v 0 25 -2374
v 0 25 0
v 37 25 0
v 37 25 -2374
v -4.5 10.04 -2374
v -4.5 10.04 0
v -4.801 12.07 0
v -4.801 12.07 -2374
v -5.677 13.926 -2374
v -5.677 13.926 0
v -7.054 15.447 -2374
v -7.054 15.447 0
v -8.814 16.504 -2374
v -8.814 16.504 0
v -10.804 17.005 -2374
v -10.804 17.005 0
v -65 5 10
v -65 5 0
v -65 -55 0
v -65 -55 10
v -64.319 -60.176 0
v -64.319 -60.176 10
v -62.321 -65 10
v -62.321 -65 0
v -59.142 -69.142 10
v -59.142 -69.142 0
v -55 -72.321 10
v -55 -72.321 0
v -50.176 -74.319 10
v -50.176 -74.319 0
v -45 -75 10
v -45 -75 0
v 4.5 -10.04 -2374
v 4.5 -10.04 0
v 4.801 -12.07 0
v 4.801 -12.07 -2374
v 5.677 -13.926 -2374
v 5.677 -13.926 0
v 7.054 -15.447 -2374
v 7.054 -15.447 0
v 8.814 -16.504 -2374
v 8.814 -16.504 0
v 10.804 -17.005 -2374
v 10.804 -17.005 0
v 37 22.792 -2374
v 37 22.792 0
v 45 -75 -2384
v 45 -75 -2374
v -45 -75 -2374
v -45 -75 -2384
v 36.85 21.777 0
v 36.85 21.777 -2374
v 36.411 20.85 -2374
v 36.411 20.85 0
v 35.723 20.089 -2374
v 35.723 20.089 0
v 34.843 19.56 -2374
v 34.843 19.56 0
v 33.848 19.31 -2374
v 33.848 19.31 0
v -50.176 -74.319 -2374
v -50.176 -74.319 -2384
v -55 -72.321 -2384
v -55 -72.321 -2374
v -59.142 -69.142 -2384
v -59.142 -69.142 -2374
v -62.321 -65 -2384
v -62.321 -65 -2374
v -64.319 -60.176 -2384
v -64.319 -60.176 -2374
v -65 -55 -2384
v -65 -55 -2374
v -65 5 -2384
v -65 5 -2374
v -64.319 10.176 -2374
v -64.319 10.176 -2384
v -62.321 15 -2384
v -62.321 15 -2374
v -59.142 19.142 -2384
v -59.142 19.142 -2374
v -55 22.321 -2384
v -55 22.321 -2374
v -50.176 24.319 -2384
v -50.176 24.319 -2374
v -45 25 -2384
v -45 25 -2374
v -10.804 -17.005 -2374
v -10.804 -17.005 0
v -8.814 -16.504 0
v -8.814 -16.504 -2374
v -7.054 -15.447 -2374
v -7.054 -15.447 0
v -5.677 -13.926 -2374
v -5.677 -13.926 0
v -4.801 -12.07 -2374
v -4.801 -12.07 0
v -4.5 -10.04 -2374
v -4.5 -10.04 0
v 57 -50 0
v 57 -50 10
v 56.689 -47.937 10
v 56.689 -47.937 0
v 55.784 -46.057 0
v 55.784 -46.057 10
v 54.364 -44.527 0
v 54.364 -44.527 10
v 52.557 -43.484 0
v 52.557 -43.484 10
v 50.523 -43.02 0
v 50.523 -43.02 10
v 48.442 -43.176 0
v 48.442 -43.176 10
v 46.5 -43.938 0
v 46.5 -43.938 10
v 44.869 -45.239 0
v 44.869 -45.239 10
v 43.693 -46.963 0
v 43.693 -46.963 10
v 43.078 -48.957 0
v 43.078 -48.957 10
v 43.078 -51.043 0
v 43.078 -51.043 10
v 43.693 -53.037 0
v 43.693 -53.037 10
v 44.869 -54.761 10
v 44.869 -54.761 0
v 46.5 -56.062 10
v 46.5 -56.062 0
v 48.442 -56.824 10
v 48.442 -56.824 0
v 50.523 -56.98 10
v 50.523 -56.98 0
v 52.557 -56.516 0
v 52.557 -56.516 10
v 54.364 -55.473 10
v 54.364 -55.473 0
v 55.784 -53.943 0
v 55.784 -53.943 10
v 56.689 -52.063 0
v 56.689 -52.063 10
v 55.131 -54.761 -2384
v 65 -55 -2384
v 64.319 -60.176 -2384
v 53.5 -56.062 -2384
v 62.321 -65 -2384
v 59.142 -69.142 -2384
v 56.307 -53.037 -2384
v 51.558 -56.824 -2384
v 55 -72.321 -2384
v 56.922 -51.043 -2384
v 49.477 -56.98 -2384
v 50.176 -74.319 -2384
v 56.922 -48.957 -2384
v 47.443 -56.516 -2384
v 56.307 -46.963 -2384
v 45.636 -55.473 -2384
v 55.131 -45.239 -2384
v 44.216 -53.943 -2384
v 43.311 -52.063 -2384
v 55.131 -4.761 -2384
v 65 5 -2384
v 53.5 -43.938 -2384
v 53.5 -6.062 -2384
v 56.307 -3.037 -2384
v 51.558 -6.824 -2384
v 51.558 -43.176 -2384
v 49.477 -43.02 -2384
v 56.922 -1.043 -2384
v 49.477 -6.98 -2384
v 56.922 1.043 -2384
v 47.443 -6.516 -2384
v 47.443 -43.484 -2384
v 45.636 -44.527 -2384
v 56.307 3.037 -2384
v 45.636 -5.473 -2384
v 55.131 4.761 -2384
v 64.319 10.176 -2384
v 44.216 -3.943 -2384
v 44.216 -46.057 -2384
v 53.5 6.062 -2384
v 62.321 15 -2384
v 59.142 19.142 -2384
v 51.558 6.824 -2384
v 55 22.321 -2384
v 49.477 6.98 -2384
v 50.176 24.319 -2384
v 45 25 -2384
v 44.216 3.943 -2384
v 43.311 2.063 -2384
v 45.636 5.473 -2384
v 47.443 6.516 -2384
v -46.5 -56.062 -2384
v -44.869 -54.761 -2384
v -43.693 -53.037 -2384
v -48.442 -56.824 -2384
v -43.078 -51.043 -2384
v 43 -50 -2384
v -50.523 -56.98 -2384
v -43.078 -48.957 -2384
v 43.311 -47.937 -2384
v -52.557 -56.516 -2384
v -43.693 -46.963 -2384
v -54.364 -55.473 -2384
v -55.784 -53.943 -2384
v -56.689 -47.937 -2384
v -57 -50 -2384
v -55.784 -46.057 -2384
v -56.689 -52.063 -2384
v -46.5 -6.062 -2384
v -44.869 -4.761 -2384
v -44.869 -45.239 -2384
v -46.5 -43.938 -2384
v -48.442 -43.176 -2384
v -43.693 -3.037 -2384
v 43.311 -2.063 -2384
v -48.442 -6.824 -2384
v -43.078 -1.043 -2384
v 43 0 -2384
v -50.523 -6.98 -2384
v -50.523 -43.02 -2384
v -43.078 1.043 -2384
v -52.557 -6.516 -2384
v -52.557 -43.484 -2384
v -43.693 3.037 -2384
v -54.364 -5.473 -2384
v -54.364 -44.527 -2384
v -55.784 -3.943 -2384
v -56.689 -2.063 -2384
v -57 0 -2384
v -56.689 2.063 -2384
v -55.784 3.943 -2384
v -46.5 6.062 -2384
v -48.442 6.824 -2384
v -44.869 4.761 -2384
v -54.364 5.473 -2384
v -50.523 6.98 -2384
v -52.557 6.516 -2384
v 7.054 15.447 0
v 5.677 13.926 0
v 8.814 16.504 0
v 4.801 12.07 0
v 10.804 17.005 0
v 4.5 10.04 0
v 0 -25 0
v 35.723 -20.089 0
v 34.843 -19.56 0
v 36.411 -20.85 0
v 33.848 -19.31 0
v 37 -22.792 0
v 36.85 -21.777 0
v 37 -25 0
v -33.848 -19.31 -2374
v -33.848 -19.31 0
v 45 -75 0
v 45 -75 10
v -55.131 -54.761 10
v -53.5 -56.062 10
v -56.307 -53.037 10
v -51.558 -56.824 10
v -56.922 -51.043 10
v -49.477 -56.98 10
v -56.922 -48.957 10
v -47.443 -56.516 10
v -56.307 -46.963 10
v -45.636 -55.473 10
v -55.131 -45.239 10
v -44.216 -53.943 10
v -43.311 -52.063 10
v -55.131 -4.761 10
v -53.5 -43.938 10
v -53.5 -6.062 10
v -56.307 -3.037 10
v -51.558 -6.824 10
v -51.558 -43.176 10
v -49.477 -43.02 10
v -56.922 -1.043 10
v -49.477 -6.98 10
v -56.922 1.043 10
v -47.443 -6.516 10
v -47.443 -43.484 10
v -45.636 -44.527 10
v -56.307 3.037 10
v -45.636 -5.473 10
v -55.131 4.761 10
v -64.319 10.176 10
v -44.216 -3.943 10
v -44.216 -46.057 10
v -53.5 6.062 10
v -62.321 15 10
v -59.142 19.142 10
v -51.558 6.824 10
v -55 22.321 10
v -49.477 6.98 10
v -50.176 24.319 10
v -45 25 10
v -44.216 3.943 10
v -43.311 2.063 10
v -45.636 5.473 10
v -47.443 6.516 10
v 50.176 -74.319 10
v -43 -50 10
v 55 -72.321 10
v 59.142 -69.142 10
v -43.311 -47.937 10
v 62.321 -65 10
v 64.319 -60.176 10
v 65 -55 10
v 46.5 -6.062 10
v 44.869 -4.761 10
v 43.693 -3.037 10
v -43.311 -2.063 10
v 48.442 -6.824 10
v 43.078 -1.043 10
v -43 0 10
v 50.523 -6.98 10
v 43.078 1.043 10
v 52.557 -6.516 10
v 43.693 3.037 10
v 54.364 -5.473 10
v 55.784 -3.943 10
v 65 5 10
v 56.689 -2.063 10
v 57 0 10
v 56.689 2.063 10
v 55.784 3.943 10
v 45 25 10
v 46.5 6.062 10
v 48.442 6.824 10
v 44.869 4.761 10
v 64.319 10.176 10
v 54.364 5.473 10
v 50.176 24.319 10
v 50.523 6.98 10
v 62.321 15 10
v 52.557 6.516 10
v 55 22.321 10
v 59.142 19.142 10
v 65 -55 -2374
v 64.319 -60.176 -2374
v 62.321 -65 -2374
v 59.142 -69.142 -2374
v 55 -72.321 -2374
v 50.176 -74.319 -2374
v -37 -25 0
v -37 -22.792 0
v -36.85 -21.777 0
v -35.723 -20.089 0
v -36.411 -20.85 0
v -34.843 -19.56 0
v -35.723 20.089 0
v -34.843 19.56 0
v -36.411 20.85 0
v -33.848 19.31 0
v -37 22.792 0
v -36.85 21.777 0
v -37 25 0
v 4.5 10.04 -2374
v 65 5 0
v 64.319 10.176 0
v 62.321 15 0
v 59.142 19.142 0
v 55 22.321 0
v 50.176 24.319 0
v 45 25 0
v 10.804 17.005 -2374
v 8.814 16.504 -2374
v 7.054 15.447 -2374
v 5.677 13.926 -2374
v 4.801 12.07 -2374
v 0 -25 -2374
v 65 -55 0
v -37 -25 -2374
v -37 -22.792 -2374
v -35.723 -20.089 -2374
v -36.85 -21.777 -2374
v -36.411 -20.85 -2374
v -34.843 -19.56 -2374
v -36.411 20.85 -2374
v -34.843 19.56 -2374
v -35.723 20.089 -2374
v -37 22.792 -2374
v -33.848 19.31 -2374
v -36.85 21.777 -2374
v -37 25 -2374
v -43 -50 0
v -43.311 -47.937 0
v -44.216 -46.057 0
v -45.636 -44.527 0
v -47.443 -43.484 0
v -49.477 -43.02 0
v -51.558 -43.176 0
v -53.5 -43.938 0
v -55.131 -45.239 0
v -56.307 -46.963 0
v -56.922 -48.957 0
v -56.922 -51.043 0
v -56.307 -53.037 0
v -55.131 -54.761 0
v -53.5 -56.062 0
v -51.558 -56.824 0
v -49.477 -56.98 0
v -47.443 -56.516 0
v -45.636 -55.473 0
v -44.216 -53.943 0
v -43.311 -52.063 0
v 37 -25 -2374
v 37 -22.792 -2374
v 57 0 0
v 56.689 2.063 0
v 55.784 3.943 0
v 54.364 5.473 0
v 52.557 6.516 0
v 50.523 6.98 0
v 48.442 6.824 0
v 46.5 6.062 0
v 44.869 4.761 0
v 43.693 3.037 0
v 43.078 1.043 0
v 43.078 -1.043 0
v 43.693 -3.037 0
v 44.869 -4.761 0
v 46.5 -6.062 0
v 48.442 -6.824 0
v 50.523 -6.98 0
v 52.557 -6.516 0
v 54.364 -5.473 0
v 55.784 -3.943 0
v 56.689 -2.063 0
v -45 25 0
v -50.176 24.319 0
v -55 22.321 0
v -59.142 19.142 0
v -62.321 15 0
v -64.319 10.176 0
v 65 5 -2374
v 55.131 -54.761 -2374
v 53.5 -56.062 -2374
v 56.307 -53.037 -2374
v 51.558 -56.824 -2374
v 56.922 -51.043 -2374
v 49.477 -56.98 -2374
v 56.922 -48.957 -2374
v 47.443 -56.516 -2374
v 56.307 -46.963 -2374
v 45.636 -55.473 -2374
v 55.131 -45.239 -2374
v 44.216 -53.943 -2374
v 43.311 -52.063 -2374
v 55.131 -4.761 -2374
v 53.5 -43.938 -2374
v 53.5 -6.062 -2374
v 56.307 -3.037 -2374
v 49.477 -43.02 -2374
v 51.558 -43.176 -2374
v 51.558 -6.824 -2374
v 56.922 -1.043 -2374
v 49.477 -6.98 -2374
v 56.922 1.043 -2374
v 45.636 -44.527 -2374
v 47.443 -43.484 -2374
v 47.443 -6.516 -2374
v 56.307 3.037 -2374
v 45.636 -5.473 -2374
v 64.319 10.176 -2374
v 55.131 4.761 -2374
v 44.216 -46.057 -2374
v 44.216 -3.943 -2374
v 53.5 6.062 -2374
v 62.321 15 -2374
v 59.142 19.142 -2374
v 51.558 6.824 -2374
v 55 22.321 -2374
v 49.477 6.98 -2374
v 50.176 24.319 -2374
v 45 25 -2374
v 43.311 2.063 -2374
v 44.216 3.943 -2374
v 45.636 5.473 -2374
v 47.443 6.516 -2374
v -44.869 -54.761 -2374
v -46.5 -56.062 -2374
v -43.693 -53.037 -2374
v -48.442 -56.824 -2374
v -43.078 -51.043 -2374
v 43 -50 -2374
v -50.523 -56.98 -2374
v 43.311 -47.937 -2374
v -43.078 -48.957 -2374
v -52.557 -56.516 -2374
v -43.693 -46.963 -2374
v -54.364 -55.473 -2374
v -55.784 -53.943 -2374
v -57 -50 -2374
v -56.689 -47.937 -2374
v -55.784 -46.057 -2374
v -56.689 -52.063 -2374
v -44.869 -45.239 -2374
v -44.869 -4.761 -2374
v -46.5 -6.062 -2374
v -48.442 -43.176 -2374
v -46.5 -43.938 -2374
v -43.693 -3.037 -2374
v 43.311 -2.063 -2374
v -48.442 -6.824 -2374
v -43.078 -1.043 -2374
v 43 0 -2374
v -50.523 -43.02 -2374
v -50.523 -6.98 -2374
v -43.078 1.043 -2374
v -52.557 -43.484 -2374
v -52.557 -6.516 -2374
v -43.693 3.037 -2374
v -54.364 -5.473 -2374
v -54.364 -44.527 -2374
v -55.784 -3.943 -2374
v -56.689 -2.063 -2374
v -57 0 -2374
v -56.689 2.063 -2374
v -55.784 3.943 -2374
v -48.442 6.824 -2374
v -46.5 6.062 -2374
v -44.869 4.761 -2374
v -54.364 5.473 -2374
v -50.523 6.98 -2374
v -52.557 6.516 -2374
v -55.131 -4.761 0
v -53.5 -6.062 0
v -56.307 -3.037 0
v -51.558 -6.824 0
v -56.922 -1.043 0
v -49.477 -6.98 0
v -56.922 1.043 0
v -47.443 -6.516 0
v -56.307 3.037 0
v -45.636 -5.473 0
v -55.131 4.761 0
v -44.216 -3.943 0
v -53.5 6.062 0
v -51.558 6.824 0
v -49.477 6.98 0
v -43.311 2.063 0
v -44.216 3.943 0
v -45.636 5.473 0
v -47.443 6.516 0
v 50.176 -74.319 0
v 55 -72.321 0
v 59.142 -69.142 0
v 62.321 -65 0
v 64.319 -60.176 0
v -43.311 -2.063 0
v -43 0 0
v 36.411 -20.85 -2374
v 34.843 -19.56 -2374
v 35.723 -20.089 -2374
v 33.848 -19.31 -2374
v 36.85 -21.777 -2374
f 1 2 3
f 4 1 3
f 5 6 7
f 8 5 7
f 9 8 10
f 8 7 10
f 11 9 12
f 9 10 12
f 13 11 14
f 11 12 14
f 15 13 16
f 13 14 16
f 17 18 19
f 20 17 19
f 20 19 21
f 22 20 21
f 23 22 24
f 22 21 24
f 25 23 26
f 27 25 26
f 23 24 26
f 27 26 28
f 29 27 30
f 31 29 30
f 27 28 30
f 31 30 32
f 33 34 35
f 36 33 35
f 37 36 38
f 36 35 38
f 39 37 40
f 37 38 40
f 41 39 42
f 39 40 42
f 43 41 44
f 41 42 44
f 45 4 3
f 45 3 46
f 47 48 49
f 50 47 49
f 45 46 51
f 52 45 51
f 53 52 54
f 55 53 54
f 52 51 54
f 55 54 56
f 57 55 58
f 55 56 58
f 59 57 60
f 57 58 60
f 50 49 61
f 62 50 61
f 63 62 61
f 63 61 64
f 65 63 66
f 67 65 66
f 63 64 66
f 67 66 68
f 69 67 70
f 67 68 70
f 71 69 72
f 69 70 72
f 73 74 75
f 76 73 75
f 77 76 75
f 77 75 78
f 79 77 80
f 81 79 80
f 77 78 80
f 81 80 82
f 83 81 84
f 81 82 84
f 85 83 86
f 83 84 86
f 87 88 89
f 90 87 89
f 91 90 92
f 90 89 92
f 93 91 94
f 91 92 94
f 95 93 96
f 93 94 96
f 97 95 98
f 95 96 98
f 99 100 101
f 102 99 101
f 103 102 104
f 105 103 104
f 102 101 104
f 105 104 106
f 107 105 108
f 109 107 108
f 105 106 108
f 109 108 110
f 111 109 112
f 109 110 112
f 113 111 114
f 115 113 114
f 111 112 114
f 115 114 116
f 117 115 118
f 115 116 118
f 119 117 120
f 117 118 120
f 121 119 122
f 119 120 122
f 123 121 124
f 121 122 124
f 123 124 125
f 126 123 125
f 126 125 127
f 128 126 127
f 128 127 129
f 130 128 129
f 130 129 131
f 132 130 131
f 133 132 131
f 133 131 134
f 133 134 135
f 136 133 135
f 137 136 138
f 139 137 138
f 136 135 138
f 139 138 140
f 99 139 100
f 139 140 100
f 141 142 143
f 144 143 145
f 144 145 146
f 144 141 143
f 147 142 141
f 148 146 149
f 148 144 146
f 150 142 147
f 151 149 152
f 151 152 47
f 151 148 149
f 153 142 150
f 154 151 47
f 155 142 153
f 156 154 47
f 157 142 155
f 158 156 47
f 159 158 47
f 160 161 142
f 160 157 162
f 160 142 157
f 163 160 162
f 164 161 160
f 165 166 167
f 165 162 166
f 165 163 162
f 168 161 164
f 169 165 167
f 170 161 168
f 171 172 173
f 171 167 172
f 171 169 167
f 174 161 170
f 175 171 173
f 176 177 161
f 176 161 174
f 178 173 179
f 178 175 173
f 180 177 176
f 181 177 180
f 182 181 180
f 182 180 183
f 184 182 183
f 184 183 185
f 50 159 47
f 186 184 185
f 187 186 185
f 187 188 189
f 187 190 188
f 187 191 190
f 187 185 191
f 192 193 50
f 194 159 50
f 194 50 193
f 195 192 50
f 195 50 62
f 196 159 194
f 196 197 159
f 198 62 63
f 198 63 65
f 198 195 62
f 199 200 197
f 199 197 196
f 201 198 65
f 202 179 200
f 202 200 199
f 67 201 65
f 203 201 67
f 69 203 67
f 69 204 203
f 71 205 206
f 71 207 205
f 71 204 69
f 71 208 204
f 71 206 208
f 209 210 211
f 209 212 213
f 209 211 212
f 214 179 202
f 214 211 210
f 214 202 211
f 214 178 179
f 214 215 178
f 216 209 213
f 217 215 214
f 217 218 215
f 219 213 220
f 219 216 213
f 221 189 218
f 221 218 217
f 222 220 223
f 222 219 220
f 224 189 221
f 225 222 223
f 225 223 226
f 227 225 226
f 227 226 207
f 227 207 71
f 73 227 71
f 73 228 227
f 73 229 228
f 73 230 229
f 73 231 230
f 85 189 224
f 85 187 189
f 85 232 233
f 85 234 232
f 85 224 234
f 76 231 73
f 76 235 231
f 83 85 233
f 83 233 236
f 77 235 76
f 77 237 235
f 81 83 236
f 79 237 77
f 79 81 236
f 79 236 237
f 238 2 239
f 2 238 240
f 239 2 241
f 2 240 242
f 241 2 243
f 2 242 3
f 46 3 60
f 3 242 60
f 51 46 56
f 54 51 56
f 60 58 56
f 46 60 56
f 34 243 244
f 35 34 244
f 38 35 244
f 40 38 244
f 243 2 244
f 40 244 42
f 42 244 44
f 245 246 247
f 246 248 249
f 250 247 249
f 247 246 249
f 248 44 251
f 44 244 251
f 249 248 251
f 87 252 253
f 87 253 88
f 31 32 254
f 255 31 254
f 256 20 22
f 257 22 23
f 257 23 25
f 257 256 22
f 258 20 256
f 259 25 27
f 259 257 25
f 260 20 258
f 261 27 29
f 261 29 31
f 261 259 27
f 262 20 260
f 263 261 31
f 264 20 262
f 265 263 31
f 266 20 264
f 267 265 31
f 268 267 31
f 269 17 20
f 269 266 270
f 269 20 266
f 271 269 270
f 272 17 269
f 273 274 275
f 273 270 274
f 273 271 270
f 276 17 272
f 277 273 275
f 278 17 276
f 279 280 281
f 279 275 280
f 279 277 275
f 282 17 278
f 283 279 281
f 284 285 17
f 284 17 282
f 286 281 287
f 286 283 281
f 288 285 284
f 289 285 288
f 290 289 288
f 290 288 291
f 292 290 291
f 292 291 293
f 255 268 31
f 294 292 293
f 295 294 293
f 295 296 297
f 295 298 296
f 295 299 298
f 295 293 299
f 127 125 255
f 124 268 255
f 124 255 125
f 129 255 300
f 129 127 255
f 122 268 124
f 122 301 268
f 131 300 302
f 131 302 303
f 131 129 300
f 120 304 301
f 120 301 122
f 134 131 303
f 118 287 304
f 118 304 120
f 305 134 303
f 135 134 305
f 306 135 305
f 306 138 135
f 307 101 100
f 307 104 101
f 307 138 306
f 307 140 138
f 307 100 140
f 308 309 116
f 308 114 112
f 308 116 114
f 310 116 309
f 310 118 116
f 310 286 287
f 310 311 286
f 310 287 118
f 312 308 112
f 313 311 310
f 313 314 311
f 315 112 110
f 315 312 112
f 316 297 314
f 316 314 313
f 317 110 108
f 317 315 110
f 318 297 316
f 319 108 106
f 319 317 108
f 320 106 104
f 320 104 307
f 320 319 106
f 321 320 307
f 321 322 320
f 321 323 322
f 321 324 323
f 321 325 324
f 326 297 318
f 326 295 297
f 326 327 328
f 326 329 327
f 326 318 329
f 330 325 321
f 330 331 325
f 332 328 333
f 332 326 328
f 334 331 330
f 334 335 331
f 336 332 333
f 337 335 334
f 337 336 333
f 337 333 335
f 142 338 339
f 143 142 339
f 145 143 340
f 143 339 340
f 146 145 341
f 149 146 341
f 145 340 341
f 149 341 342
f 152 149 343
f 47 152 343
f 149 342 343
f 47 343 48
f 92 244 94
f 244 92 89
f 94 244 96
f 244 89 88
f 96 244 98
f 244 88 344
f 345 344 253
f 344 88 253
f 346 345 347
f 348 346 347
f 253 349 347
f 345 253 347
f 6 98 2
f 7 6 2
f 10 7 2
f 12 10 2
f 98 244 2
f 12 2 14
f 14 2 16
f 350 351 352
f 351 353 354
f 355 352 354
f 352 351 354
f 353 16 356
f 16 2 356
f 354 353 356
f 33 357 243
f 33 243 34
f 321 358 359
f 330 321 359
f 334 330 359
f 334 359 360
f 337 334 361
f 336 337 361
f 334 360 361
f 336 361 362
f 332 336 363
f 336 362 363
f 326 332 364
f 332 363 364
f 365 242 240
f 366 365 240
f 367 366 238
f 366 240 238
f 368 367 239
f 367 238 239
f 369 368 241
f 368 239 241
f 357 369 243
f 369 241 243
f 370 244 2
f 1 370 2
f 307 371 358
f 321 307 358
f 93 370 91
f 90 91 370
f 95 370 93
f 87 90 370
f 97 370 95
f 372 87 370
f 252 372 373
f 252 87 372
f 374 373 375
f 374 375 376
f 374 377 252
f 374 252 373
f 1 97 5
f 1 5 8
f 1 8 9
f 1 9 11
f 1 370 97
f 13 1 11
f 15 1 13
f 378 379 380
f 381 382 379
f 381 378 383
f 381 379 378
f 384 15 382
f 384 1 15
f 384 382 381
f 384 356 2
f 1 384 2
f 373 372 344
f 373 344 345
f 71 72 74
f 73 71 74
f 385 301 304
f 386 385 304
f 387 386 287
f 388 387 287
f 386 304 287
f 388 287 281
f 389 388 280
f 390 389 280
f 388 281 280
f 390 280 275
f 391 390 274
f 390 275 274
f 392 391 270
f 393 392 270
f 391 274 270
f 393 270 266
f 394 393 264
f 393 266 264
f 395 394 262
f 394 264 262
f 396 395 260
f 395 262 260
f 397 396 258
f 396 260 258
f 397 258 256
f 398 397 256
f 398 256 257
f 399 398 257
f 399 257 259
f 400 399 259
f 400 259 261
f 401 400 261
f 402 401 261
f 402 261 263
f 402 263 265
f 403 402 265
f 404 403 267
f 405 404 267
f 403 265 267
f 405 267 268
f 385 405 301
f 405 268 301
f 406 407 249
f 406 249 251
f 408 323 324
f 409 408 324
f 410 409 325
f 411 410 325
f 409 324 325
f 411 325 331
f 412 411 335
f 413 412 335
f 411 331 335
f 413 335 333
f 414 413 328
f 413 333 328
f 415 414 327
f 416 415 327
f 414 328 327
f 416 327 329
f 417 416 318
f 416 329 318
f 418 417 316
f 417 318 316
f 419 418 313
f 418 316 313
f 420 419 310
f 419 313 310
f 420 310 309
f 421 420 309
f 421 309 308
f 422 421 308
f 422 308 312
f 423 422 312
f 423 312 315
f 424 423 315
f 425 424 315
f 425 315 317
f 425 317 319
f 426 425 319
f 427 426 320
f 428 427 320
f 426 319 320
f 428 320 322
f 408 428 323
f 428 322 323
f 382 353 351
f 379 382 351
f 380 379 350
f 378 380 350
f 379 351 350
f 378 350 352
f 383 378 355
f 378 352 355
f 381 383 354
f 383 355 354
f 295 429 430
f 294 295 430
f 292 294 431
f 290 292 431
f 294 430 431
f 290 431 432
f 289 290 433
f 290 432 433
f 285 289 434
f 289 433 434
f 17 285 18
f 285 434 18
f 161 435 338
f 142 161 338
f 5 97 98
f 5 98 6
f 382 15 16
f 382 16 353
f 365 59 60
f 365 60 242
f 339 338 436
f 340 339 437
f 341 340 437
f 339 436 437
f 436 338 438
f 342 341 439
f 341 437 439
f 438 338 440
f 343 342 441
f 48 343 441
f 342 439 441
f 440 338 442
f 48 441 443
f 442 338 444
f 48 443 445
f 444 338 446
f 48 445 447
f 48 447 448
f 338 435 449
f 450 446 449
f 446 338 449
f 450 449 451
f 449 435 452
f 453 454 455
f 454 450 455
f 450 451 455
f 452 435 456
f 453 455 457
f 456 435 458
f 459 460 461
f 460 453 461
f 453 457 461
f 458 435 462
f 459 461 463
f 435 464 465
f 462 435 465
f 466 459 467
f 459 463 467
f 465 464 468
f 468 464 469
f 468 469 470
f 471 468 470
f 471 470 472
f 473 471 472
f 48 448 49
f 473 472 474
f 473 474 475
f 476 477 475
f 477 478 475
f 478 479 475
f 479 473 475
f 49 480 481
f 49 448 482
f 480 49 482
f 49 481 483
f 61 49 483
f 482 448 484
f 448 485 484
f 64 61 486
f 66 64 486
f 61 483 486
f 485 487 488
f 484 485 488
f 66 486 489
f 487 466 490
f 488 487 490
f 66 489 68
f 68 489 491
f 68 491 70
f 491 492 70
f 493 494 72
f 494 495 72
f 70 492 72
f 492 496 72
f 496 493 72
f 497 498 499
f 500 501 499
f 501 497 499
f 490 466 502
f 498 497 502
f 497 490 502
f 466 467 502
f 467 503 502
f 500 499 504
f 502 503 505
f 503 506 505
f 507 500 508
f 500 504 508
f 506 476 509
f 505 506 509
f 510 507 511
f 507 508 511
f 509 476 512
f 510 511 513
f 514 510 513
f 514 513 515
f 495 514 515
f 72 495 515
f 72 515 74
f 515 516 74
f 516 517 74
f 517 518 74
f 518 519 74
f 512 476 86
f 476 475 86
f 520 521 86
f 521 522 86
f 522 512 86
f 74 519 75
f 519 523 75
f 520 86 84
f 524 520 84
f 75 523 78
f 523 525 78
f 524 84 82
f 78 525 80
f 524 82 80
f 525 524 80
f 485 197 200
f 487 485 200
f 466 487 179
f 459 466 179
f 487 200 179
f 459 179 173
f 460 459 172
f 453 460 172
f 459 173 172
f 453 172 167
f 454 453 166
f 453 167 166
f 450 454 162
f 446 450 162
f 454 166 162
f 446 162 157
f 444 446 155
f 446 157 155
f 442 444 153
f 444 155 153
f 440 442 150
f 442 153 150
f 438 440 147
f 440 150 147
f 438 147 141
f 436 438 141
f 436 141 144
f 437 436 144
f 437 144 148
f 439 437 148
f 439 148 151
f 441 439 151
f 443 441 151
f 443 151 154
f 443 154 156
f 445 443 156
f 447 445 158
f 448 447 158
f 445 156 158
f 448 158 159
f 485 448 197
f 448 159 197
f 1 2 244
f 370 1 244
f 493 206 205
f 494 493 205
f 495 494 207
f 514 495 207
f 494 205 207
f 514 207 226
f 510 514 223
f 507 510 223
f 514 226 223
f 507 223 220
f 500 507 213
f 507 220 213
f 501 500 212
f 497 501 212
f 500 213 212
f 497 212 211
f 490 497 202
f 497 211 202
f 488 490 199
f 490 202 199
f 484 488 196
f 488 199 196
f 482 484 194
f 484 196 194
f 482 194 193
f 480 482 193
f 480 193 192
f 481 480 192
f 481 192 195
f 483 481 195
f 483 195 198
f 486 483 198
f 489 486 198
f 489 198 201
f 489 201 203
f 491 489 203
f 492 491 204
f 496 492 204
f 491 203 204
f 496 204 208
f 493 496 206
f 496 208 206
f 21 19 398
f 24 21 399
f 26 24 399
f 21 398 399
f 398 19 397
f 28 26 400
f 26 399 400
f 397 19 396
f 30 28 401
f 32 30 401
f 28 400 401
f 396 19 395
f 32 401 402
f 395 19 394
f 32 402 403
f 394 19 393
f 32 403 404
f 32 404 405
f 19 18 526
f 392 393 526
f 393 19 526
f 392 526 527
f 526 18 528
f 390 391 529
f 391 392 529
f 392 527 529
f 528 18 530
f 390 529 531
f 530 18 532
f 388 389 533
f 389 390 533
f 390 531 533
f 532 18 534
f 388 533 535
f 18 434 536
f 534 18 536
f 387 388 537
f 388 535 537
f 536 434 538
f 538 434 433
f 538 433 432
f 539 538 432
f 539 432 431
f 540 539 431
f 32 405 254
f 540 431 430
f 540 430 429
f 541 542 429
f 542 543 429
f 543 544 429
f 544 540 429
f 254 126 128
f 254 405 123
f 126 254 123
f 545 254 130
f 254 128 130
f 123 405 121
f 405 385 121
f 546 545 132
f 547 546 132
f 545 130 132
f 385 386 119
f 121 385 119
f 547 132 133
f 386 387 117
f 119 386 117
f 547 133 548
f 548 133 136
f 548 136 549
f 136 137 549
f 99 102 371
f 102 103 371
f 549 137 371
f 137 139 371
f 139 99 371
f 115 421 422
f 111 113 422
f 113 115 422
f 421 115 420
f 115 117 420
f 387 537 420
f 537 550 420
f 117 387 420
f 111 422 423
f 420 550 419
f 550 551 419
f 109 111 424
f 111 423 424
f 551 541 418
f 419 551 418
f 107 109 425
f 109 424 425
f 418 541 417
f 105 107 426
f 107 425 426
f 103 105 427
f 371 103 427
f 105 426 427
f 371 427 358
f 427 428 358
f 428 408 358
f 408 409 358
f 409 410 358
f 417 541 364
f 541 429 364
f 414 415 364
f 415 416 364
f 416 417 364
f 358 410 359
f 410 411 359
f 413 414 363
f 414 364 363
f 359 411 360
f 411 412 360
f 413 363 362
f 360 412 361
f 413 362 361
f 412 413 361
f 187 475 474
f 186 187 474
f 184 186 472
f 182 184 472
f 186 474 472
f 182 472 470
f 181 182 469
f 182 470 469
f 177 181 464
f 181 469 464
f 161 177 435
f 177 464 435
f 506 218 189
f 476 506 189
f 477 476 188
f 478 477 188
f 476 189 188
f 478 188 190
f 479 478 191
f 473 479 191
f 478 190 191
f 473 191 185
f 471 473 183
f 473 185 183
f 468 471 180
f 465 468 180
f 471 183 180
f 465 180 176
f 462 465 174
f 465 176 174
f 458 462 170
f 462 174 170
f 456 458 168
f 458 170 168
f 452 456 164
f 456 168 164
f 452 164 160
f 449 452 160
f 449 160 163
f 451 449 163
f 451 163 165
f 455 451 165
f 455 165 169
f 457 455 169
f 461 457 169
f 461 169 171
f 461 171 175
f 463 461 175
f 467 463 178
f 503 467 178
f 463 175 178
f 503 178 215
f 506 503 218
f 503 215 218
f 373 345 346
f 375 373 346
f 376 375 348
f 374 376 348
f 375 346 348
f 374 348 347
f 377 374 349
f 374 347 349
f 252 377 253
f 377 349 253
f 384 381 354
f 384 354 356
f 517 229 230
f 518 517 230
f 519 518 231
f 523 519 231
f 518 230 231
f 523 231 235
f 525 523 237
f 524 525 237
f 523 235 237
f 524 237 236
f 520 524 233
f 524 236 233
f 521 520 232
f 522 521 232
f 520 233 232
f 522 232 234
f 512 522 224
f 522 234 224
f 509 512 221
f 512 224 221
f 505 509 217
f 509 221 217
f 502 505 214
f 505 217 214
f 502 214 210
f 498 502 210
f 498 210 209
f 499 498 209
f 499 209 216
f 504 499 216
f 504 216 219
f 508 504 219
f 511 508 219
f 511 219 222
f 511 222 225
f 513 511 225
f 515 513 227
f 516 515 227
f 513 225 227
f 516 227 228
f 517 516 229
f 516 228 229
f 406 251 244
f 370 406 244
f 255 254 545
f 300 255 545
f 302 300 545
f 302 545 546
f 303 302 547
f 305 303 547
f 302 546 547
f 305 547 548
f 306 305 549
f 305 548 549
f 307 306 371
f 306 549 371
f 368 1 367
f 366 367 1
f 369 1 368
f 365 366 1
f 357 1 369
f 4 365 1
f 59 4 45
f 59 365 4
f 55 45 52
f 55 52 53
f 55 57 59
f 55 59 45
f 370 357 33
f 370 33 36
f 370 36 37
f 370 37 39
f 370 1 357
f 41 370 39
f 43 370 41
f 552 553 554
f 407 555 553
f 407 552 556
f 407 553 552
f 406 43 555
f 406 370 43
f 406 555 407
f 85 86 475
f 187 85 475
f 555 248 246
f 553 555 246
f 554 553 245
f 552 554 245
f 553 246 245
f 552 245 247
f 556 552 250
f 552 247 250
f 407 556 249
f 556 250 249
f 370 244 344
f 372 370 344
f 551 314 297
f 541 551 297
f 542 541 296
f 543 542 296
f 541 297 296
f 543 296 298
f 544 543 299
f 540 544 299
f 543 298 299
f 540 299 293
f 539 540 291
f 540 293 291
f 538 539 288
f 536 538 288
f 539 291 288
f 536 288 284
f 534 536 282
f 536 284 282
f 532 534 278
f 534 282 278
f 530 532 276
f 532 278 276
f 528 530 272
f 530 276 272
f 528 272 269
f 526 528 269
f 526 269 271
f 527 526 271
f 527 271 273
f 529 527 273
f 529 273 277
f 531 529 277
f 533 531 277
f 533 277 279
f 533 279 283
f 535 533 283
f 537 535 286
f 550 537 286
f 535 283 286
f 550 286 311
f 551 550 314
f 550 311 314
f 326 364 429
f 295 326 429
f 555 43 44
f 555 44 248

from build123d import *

# Parameters (mm, degrees)
MEMBER_5_1_DEPTH    = 2374
MEMBER_5_2_DEPTH    = 2374
EXTRUDE_1_DEPTH     = 10
SKETCH_15_R         = 7
CUT_EXTRUDE_1_DEPTH = 10
EXTRUDE_2_DEPTH     = 10
SKETCH_17_R         = 7
CUT_EXTRUDE_2_DEPTH = 10


with BuildPart() as part:
    # 草图12 → Member 5_1 (new body)
    with BuildSketch(Plane(origin=(0, 0, 0), x_dir=(1, 0, 0), z_dir=(0, 0, -1))):
        with BuildLine():
            Line((0, -25), (37, -25))
            Line((37, -25), (37, -22.792319516))
            ThreePointArc((37, -22.792319516), (36.095071711, -20.443787461), (33.848226964, -19.309685745))
            Line((33.848226964, -19.309685745), (10.803546073, -17.005458605))
            ThreePointArc((10.803546073, -17.005458605), (6.309856578, -14.737255173), (4.5, -10.040191063))
            Line((4.5, -10.040191063), (4.5, 10.040191063))
            ThreePointArc((4.5, 10.040191063), (6.309856578, 14.737255173), (10.803546073, 17.005458605))
            Line((10.803546073, 17.005458605), (33.848226964, 19.309685745))
            ThreePointArc((33.848226964, 19.309685745), (36.095071711, 20.443787461), (37, 22.792319516))
            Line((37, 22.792319516), (37, 25))
            Line((37, 25), (0, 25))
            Line((0, 25), (0, -25))
        make_face()
    extrude(amount=MEMBER_5_1_DEPTH)


with BuildPart() as body_2:
    # 草图13 → Member 5_2 (new body)
    with BuildSketch(Plane(origin=(0, 0, 0), x_dir=(-1, 0, 0), z_dir=(0, 0, -1))):
        with BuildLine():
            Line((0, -25), (37, -25))
            Line((37, -25), (37, -22.792319516))
            ThreePointArc((37, -22.792319516), (36.095071711, -20.443787461), (33.848226964, -19.309685745))
            Line((33.848226964, -19.309685745), (10.803546073, -17.005458605))
            ThreePointArc((10.803546073, -17.005458605), (6.309856578, -14.737255173), (4.5, -10.040191063))
            Line((4.5, -10.040191063), (4.5, 10.040191063))
            ThreePointArc((4.5, 10.040191063), (6.309856578, 14.737255173), (10.803546073, 17.005458605))
            Line((10.803546073, 17.005458605), (33.848226964, 19.309685745))
            ThreePointArc((33.848226964, 19.309685745), (36.095071711, 20.443787461), (37, 22.792319516))
            Line((37, 22.792319516), (37, 25))
            Line((37, 25), (0, 25))
            Line((0, 25), (0, -25))
        make_face()
    extrude(amount=MEMBER_5_2_DEPTH)


with BuildPart() as body_3:
    # 草图14 → 凸台-拉伸1 (new body)
    with BuildSketch(Plane.XY):
        with BuildLine():
            Line((45, 25), (-45, 25))
            ThreePointArc((-45, 25), (-59.142135624, 19.142135624), (-65, 5))
            Line((-65, 5), (-65, -55))
            ThreePointArc((-65, -55), (-59.142135624, -69.142135624), (-45, -75))
            Line((-45, -75), (45, -75))
            ThreePointArc((45, -75), (59.142135624, -69.142135624), (65, -55))
            Line((65, -55), (65, 5))
            ThreePointArc((65, 5), (59.142135624, 19.142135624), (45, 25))
        make_face()
    extrude(amount=EXTRUDE_1_DEPTH)

    # 草图15 → 切除-拉伸1 (cut)
    with BuildSketch(Plane.XY.offset(10)):
        with Locations((-50, 0)):
            Circle(SKETCH_15_R)
        with Locations((-50, -50)):
            Circle(SKETCH_15_R)
        with Locations((50, 0)):
            Circle(SKETCH_15_R)
        with Locations((50, -50)):
            Circle(SKETCH_15_R)
    extrude(amount=-CUT_EXTRUDE_1_DEPTH, mode=Mode.SUBTRACT)


with BuildPart() as body_4:
    # 草图16 → 凸台-拉伸2 (new body)
    with BuildSketch(Plane(origin=(0, 0, -2374), x_dir=(-1, 0, 0), z_dir=(0, 0, -1))):
        with BuildLine():
            Line((-65, 5), (-65, -55))
            ThreePointArc((-65, -55), (-59.142135624, -69.142135624), (-45, -75))
            Line((-45, -75), (45, -75))
            ThreePointArc((45, -75), (59.142135624, -69.142135624), (65, -55))
            Line((65, -55), (65, 5))
            ThreePointArc((65, 5), (59.142135624, 19.142135624), (45, 25))
            Line((45, 25), (-45, 25))
            ThreePointArc((-45, 25), (-59.142135624, 19.142135624), (-65, 5))
        make_face()
    extrude(amount=EXTRUDE_2_DEPTH)

    # 草图17 → 切除-拉伸2 (cut)
    with BuildSketch(Plane(origin=(0, 0, -2384), x_dir=(-1, 0, 0), z_dir=(0, 0, -1))):
        with Locations((50, 0)):
            Circle(SKETCH_17_R)
        with Locations((50, -50)):
            Circle(SKETCH_17_R)
        with Locations((-50, -50)):
            Circle(SKETCH_17_R)
        with Locations((-50, 0)):
            Circle(SKETCH_17_R)
    extrude(amount=-CUT_EXTRUDE_2_DEPTH, mode=Mode.SUBTRACT)


solid = Compound([part.part, body_2.part, body_3.part, body_4.part])
